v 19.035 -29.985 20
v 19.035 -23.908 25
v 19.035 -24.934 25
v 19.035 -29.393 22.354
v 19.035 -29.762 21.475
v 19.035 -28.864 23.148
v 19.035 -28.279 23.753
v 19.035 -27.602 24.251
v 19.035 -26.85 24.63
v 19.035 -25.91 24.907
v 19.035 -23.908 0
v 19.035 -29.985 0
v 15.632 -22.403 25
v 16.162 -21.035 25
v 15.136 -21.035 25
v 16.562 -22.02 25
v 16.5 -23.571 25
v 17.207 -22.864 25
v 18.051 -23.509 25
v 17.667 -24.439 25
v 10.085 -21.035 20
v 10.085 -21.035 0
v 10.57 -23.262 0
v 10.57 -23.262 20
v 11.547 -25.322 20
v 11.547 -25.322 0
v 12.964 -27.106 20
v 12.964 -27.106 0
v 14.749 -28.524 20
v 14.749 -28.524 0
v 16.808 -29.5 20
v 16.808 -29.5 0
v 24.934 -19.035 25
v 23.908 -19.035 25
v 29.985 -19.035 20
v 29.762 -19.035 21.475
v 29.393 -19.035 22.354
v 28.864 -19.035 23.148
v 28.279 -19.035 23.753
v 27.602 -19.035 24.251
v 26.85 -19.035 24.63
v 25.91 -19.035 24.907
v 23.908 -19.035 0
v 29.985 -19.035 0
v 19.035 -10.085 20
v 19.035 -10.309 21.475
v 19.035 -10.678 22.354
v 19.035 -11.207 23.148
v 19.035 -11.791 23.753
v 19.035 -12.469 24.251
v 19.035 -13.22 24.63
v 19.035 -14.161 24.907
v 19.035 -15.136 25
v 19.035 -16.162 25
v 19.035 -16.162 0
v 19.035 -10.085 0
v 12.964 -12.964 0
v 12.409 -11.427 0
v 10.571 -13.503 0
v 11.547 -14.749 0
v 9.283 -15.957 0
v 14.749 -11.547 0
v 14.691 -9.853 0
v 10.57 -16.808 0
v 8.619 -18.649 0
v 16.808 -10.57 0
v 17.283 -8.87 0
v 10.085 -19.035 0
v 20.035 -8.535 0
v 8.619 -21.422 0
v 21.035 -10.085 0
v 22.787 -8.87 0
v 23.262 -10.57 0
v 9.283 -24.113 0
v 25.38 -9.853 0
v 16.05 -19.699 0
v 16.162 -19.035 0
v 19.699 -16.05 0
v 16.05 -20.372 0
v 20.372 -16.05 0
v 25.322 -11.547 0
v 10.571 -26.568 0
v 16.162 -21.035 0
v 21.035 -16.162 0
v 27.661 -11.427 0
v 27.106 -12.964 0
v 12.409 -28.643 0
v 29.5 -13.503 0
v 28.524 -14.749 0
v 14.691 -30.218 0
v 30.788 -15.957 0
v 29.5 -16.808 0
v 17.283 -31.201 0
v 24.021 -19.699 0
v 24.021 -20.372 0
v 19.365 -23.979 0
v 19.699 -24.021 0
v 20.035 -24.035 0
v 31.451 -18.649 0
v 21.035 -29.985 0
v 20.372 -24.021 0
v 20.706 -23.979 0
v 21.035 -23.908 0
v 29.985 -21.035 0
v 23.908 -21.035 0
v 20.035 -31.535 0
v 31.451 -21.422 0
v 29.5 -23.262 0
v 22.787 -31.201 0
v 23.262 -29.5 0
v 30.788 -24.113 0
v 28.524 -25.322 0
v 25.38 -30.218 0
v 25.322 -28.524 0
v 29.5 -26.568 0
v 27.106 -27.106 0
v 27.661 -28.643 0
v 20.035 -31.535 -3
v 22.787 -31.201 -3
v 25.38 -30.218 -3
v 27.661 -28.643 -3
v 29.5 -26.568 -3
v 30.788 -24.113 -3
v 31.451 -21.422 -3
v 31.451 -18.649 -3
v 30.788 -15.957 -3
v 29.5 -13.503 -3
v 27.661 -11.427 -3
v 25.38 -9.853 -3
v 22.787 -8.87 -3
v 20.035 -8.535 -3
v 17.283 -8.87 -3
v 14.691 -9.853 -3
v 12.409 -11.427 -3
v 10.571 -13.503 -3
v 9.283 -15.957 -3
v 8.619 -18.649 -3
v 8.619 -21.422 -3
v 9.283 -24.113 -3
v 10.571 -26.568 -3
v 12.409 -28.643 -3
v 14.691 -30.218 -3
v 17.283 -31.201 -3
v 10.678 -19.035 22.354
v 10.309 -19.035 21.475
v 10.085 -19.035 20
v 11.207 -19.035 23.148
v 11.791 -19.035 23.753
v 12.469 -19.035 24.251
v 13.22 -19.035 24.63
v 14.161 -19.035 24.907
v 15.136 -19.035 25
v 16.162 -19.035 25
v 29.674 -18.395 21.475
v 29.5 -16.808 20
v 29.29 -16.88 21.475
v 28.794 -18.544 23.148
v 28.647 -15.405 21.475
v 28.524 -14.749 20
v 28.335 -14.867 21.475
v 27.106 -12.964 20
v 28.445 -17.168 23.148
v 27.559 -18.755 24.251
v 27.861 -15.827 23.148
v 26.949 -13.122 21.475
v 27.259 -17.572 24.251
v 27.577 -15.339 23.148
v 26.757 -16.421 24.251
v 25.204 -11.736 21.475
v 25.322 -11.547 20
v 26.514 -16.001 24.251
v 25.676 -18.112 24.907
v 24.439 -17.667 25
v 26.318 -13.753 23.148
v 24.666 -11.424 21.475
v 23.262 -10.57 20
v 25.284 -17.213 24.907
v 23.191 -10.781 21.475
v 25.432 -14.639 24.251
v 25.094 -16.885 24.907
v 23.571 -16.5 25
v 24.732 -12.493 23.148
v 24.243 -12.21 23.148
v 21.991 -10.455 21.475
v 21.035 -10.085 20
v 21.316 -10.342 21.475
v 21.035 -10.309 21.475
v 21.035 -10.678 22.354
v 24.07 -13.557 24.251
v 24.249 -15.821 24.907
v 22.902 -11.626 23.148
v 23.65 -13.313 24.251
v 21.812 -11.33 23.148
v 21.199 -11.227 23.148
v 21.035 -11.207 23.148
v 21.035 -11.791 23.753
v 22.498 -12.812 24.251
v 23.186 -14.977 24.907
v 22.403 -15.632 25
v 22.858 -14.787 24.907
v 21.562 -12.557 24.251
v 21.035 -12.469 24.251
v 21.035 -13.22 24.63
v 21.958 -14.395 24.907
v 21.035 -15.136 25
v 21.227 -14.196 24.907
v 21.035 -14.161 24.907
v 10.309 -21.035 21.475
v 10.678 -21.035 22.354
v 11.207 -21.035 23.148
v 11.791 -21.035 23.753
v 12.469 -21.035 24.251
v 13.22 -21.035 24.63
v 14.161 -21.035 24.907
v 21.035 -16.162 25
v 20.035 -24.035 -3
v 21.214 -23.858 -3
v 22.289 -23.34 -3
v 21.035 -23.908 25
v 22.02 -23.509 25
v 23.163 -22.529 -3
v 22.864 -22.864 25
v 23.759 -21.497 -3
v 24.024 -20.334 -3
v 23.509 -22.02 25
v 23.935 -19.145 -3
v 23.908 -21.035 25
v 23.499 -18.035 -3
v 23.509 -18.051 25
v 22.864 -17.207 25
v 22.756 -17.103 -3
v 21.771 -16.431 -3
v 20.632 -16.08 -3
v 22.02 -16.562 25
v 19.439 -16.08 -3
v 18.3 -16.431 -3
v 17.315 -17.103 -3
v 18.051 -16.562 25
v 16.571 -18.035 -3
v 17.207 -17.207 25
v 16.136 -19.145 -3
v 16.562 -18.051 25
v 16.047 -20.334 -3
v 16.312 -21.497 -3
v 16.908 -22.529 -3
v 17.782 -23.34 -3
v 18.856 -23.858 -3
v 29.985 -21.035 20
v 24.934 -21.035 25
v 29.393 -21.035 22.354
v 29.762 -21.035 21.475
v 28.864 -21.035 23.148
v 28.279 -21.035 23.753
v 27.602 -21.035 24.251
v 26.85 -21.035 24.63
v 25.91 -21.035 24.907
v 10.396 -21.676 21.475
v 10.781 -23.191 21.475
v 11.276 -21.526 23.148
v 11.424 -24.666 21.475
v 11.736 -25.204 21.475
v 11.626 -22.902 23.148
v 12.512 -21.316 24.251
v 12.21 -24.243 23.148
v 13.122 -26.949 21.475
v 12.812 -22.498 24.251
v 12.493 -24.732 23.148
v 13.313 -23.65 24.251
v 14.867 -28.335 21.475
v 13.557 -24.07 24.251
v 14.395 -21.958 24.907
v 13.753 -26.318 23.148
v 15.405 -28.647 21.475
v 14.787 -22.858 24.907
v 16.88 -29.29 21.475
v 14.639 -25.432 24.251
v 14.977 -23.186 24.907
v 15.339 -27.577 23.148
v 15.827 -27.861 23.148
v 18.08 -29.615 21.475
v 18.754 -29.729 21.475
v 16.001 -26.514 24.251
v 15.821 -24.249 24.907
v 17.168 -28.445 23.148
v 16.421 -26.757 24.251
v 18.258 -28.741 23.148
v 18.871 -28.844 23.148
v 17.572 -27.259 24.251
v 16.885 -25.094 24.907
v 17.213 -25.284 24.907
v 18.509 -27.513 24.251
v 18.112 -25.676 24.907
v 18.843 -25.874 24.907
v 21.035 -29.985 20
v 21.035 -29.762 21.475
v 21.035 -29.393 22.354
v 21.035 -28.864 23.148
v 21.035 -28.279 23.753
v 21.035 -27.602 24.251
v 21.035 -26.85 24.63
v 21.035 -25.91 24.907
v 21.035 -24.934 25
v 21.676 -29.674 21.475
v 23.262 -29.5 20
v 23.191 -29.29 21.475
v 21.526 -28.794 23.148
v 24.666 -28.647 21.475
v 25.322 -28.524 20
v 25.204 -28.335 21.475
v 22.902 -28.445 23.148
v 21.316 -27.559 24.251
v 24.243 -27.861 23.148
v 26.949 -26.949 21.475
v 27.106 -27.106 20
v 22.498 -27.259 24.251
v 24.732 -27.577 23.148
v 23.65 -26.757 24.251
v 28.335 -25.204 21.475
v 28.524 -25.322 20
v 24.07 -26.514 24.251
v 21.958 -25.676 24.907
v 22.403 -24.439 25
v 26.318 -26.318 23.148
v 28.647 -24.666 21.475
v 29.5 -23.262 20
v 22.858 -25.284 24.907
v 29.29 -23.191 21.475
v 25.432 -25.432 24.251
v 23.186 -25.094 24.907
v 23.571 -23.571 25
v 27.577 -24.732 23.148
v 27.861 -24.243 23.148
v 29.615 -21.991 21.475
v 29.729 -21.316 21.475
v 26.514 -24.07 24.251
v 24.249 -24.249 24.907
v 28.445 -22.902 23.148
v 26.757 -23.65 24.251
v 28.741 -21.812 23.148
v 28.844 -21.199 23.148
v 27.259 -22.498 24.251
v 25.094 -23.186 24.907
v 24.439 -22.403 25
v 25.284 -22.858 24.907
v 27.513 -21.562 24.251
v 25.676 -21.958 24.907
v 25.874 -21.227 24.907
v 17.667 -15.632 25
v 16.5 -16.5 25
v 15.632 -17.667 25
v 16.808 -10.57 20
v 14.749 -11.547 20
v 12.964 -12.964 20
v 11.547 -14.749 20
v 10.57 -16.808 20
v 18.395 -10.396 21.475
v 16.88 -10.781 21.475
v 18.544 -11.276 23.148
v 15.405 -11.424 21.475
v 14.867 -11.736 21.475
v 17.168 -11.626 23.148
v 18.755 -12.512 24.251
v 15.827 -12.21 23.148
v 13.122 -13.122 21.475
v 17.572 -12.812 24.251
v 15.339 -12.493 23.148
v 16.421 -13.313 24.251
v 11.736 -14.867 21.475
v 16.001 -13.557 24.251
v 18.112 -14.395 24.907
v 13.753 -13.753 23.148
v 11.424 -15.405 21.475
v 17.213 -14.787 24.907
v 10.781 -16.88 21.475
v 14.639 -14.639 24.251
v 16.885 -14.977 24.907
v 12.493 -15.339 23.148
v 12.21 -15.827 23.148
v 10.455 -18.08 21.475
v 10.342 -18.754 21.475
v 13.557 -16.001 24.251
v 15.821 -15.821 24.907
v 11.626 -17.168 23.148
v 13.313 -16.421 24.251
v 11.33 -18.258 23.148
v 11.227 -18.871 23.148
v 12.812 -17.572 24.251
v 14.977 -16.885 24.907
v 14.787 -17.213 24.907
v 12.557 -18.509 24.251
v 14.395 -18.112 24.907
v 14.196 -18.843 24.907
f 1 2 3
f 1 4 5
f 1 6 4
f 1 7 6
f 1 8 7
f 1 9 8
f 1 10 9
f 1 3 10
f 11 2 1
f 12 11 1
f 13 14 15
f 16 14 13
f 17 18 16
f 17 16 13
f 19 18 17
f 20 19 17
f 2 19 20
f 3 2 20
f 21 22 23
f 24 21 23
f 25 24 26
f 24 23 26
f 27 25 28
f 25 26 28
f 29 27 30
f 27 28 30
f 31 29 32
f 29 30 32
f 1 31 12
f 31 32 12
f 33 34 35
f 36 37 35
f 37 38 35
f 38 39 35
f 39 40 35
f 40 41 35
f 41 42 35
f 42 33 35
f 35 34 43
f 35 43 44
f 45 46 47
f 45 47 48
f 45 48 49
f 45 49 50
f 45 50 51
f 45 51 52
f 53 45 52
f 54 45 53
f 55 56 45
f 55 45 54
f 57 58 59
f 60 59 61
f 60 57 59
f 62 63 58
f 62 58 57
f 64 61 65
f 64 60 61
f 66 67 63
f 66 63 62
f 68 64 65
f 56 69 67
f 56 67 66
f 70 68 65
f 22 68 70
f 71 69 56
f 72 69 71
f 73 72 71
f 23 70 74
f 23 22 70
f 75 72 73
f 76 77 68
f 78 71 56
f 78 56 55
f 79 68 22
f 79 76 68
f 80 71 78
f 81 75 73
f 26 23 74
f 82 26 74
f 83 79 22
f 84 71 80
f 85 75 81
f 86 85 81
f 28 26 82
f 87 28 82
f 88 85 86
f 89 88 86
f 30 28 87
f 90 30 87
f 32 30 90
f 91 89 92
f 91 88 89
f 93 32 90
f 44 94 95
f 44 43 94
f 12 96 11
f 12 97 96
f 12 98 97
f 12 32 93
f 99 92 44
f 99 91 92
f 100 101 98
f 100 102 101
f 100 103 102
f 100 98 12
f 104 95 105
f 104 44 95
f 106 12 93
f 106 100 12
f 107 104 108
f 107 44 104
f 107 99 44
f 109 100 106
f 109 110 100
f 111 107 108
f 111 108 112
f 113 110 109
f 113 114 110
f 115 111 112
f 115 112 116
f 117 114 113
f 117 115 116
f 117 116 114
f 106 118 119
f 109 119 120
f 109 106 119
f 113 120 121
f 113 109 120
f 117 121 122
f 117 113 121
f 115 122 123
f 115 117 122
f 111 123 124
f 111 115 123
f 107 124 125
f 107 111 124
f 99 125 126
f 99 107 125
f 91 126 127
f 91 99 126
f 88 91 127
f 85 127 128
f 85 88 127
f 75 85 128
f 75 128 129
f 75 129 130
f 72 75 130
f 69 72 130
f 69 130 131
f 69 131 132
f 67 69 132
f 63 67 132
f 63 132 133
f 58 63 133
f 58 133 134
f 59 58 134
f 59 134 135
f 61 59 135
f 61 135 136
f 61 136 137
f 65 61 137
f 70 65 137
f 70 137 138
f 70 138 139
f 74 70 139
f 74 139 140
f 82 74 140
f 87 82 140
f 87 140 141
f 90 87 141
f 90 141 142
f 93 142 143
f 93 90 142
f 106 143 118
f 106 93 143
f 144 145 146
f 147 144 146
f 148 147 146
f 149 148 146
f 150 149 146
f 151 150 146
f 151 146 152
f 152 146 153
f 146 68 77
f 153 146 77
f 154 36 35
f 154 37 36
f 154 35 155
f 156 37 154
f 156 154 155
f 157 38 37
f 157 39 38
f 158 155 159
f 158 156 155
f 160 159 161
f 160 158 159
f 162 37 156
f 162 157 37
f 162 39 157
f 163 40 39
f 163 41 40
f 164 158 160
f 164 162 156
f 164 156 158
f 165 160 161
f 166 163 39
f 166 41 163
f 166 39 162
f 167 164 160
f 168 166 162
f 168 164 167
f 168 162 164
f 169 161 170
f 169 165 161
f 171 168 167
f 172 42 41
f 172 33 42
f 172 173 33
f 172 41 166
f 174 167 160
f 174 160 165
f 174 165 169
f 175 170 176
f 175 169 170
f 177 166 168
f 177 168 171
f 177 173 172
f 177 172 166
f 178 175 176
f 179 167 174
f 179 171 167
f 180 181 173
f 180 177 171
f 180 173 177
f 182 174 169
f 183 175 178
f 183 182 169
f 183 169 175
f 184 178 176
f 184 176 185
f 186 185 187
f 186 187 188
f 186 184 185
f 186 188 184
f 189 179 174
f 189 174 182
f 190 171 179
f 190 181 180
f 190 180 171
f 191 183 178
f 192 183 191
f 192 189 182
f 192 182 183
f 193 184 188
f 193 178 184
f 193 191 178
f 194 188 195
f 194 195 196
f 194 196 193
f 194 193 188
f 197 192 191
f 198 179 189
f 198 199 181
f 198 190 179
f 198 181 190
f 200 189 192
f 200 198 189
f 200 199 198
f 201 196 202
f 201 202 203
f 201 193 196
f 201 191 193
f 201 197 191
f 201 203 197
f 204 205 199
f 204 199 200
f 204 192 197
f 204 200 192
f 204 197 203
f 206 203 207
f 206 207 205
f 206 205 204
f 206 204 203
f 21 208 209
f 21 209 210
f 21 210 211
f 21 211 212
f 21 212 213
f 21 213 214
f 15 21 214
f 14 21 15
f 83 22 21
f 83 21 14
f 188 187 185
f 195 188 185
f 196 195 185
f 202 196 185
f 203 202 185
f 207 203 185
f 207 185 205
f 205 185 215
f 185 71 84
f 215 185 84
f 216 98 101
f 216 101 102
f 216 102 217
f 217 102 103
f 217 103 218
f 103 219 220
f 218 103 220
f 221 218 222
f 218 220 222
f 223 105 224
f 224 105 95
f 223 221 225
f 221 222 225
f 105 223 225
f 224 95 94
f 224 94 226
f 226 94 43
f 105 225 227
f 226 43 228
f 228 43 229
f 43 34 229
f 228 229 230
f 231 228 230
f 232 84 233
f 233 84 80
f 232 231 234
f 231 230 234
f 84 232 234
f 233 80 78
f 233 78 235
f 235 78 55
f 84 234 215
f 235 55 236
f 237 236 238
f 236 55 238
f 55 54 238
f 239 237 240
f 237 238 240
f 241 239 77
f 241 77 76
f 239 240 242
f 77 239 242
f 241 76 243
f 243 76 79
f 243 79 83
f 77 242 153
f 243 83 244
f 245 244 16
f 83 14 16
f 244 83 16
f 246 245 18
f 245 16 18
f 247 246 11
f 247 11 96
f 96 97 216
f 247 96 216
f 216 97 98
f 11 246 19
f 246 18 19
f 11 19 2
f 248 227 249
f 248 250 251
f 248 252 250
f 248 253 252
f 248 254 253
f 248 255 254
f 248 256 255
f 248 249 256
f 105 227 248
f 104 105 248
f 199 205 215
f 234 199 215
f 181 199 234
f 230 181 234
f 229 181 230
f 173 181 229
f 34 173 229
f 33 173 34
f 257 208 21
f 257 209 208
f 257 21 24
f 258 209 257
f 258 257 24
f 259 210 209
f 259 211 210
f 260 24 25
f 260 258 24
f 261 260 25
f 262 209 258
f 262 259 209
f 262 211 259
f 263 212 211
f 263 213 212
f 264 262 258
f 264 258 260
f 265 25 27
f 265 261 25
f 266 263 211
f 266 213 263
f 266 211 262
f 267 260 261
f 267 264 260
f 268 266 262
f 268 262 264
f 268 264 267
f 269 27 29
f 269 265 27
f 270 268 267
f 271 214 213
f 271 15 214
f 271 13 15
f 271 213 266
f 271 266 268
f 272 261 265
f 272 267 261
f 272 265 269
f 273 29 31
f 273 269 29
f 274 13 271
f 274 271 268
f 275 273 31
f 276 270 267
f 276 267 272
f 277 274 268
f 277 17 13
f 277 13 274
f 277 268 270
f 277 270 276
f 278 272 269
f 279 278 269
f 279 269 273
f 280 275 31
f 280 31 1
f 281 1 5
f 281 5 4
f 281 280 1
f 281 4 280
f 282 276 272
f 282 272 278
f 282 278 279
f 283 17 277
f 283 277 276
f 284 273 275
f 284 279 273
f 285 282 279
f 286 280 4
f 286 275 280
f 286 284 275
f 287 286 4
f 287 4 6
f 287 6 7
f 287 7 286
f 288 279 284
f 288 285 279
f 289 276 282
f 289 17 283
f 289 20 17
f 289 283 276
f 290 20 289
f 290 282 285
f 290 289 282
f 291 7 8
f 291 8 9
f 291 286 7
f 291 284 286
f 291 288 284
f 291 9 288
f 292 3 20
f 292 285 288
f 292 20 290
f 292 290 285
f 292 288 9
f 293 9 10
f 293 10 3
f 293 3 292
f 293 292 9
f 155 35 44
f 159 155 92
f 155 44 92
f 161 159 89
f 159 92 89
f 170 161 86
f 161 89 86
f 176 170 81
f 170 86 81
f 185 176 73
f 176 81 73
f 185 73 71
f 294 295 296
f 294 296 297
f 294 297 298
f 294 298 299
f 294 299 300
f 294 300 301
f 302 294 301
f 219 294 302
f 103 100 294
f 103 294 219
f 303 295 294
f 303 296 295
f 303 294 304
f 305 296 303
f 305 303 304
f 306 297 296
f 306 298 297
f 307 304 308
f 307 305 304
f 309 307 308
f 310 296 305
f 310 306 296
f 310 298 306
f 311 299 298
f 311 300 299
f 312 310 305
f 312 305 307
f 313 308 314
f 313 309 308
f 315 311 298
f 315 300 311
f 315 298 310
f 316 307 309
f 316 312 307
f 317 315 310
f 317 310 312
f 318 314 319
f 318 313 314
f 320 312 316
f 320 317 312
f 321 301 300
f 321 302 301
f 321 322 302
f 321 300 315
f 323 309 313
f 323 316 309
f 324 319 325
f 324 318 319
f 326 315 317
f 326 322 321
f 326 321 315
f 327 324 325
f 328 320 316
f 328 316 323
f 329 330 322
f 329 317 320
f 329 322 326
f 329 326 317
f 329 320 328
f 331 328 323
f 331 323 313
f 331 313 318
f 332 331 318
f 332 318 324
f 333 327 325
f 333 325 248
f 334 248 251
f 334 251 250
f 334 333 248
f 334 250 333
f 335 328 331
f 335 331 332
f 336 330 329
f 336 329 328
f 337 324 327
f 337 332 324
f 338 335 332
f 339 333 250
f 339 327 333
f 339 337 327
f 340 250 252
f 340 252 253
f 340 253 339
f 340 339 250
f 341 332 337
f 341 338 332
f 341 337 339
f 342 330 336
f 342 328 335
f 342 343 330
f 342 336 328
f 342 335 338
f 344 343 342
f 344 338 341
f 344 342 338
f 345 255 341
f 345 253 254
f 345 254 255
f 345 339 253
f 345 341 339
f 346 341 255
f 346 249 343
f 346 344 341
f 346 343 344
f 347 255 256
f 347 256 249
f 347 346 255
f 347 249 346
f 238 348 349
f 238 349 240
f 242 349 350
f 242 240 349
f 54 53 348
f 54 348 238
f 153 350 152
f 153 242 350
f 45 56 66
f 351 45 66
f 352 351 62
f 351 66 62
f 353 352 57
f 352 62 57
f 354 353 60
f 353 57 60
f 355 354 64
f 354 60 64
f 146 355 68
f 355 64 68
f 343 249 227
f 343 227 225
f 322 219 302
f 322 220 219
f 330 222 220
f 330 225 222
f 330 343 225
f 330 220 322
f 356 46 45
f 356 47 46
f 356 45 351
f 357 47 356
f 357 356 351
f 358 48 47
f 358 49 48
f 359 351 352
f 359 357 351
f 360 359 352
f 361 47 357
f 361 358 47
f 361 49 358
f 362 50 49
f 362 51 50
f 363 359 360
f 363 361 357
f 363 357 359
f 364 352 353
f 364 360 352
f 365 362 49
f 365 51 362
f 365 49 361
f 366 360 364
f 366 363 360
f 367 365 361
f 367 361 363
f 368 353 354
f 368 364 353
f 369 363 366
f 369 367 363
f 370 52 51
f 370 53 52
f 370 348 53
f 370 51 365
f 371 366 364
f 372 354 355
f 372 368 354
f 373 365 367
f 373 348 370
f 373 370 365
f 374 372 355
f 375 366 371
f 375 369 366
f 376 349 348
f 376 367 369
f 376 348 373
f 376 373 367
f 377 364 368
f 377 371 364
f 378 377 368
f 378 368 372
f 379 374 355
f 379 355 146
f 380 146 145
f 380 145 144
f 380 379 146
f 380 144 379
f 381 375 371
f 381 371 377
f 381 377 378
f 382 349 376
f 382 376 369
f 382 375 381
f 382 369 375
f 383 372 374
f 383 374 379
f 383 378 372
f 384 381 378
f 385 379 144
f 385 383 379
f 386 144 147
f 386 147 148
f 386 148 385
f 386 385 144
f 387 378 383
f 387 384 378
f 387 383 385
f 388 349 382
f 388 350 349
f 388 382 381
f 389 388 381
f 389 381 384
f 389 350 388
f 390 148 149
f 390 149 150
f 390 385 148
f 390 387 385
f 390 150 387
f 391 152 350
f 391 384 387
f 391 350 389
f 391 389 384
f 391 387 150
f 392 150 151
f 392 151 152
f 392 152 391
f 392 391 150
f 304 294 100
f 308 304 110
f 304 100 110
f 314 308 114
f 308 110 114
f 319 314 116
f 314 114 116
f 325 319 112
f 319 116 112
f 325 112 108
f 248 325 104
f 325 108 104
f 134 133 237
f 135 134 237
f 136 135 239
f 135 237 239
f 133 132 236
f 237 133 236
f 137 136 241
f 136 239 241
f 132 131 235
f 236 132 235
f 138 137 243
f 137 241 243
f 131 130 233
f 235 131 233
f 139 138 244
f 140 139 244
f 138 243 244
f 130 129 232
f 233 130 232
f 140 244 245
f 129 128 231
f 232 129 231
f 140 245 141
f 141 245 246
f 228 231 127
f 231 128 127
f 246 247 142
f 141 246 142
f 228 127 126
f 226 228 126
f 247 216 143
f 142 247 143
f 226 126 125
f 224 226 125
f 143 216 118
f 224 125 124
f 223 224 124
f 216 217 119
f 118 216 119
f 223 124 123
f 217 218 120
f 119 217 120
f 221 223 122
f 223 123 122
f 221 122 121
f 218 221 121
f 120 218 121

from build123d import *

# Parameters (mm, degrees)
F0_R      = 10
F0_R_2    = 4
F1_DEPTH  = 25
F2_R      = 11.5
F2_R_2    = 4
F3_DEPTH  = 3
F4_W      = 15.4053421468
F4_H      = 2
F4_W_2    = 2
F4_H_2    = 14.8476130934
F4_H_3    = 18.3621469838
F5_DEPTH  = 25
F6_R      = 5
F7_W      = 54.985769093
F7_H      = 45.2365130186
F8_DEPTH  = 25
F11_COUNT = 4
F11_ANGLE = 270


with BuildPart() as f1:
    # F0 (on Top) → F1 (new body)
    with BuildSketch(Plane.XY):
        Circle(F0_R)
        Circle(F0_R_2, mode=Mode.SUBTRACT)
    extrude(amount=F1_DEPTH)

    # F2 (on Top) → F3 (join)
    with BuildSketch(Plane.XY):
        Circle(F2_R)
        Circle(F2_R_2, mode=Mode.SUBTRACT)
    extrude(amount=-F3_DEPTH)

    # F4 (on Top) → F5 (cut)
    with BuildSketch(Plane.XY):
        with Locations((-8.7026710734, 0)):
            Rectangle(F4_W, F4_H)
        with Locations((0, 8.4238065467)):
            Rectangle(F4_W_2, F4_H_2)
        Rectangle(F4_W_2, F4_H)
        Polygon((17.6404397935, 1), (1, 1), (1, -1), (18.0223640054, -1), align=None)
        with Locations((0, -10.1810734919)):
            Rectangle(F4_W_2, F4_H_3)
    extrude(amount=F5_DEPTH, mode=Mode.SUBTRACT)

    # F6
    f6_edges = [f1.edges().sort_by_distance(p)[0] for p in [
        (7.071068, -7.071068, 25),
        (7.071068, 7.071068, 25),
        (-7.071068, 7.071068, 25),
        (-7.071068, -7.071068, 25),
    ]]
    fillet(f6_edges, radius=F6_R)


with BuildPart() as f8:
    # F7 (on Top) → F8 (new body)
    with BuildSketch(Plane.XY):
        with Locations((-82.9663015902, -56.8597912788)):
            Rectangle(F7_W, F7_H)
    extrude(amount=F8_DEPTH)


with BuildPart() as f11_1:
    # F11: instance of F1
    add(f1.part.rotate(Axis((0, -20.0353357941, 8.0697890371), (0, 0, -1)), 1 * F11_ANGLE / (F11_COUNT - 1)))


with BuildPart() as f11_2:
    # F11: instance of F1
    add(f1.part.rotate(Axis((0, -20.0353357941, 8.0697890371), (0, 0, -1)), 2 * F11_ANGLE / (F11_COUNT - 1)))


with BuildPart() as f11_3:
    # F11: instance of F1
    add(f1.part.rotate(Axis((0, -20.0353357941, 8.0697890371), (0, 0, -1)), 3 * F11_ANGLE / (F11_COUNT - 1)))


solid = f11_1.part
